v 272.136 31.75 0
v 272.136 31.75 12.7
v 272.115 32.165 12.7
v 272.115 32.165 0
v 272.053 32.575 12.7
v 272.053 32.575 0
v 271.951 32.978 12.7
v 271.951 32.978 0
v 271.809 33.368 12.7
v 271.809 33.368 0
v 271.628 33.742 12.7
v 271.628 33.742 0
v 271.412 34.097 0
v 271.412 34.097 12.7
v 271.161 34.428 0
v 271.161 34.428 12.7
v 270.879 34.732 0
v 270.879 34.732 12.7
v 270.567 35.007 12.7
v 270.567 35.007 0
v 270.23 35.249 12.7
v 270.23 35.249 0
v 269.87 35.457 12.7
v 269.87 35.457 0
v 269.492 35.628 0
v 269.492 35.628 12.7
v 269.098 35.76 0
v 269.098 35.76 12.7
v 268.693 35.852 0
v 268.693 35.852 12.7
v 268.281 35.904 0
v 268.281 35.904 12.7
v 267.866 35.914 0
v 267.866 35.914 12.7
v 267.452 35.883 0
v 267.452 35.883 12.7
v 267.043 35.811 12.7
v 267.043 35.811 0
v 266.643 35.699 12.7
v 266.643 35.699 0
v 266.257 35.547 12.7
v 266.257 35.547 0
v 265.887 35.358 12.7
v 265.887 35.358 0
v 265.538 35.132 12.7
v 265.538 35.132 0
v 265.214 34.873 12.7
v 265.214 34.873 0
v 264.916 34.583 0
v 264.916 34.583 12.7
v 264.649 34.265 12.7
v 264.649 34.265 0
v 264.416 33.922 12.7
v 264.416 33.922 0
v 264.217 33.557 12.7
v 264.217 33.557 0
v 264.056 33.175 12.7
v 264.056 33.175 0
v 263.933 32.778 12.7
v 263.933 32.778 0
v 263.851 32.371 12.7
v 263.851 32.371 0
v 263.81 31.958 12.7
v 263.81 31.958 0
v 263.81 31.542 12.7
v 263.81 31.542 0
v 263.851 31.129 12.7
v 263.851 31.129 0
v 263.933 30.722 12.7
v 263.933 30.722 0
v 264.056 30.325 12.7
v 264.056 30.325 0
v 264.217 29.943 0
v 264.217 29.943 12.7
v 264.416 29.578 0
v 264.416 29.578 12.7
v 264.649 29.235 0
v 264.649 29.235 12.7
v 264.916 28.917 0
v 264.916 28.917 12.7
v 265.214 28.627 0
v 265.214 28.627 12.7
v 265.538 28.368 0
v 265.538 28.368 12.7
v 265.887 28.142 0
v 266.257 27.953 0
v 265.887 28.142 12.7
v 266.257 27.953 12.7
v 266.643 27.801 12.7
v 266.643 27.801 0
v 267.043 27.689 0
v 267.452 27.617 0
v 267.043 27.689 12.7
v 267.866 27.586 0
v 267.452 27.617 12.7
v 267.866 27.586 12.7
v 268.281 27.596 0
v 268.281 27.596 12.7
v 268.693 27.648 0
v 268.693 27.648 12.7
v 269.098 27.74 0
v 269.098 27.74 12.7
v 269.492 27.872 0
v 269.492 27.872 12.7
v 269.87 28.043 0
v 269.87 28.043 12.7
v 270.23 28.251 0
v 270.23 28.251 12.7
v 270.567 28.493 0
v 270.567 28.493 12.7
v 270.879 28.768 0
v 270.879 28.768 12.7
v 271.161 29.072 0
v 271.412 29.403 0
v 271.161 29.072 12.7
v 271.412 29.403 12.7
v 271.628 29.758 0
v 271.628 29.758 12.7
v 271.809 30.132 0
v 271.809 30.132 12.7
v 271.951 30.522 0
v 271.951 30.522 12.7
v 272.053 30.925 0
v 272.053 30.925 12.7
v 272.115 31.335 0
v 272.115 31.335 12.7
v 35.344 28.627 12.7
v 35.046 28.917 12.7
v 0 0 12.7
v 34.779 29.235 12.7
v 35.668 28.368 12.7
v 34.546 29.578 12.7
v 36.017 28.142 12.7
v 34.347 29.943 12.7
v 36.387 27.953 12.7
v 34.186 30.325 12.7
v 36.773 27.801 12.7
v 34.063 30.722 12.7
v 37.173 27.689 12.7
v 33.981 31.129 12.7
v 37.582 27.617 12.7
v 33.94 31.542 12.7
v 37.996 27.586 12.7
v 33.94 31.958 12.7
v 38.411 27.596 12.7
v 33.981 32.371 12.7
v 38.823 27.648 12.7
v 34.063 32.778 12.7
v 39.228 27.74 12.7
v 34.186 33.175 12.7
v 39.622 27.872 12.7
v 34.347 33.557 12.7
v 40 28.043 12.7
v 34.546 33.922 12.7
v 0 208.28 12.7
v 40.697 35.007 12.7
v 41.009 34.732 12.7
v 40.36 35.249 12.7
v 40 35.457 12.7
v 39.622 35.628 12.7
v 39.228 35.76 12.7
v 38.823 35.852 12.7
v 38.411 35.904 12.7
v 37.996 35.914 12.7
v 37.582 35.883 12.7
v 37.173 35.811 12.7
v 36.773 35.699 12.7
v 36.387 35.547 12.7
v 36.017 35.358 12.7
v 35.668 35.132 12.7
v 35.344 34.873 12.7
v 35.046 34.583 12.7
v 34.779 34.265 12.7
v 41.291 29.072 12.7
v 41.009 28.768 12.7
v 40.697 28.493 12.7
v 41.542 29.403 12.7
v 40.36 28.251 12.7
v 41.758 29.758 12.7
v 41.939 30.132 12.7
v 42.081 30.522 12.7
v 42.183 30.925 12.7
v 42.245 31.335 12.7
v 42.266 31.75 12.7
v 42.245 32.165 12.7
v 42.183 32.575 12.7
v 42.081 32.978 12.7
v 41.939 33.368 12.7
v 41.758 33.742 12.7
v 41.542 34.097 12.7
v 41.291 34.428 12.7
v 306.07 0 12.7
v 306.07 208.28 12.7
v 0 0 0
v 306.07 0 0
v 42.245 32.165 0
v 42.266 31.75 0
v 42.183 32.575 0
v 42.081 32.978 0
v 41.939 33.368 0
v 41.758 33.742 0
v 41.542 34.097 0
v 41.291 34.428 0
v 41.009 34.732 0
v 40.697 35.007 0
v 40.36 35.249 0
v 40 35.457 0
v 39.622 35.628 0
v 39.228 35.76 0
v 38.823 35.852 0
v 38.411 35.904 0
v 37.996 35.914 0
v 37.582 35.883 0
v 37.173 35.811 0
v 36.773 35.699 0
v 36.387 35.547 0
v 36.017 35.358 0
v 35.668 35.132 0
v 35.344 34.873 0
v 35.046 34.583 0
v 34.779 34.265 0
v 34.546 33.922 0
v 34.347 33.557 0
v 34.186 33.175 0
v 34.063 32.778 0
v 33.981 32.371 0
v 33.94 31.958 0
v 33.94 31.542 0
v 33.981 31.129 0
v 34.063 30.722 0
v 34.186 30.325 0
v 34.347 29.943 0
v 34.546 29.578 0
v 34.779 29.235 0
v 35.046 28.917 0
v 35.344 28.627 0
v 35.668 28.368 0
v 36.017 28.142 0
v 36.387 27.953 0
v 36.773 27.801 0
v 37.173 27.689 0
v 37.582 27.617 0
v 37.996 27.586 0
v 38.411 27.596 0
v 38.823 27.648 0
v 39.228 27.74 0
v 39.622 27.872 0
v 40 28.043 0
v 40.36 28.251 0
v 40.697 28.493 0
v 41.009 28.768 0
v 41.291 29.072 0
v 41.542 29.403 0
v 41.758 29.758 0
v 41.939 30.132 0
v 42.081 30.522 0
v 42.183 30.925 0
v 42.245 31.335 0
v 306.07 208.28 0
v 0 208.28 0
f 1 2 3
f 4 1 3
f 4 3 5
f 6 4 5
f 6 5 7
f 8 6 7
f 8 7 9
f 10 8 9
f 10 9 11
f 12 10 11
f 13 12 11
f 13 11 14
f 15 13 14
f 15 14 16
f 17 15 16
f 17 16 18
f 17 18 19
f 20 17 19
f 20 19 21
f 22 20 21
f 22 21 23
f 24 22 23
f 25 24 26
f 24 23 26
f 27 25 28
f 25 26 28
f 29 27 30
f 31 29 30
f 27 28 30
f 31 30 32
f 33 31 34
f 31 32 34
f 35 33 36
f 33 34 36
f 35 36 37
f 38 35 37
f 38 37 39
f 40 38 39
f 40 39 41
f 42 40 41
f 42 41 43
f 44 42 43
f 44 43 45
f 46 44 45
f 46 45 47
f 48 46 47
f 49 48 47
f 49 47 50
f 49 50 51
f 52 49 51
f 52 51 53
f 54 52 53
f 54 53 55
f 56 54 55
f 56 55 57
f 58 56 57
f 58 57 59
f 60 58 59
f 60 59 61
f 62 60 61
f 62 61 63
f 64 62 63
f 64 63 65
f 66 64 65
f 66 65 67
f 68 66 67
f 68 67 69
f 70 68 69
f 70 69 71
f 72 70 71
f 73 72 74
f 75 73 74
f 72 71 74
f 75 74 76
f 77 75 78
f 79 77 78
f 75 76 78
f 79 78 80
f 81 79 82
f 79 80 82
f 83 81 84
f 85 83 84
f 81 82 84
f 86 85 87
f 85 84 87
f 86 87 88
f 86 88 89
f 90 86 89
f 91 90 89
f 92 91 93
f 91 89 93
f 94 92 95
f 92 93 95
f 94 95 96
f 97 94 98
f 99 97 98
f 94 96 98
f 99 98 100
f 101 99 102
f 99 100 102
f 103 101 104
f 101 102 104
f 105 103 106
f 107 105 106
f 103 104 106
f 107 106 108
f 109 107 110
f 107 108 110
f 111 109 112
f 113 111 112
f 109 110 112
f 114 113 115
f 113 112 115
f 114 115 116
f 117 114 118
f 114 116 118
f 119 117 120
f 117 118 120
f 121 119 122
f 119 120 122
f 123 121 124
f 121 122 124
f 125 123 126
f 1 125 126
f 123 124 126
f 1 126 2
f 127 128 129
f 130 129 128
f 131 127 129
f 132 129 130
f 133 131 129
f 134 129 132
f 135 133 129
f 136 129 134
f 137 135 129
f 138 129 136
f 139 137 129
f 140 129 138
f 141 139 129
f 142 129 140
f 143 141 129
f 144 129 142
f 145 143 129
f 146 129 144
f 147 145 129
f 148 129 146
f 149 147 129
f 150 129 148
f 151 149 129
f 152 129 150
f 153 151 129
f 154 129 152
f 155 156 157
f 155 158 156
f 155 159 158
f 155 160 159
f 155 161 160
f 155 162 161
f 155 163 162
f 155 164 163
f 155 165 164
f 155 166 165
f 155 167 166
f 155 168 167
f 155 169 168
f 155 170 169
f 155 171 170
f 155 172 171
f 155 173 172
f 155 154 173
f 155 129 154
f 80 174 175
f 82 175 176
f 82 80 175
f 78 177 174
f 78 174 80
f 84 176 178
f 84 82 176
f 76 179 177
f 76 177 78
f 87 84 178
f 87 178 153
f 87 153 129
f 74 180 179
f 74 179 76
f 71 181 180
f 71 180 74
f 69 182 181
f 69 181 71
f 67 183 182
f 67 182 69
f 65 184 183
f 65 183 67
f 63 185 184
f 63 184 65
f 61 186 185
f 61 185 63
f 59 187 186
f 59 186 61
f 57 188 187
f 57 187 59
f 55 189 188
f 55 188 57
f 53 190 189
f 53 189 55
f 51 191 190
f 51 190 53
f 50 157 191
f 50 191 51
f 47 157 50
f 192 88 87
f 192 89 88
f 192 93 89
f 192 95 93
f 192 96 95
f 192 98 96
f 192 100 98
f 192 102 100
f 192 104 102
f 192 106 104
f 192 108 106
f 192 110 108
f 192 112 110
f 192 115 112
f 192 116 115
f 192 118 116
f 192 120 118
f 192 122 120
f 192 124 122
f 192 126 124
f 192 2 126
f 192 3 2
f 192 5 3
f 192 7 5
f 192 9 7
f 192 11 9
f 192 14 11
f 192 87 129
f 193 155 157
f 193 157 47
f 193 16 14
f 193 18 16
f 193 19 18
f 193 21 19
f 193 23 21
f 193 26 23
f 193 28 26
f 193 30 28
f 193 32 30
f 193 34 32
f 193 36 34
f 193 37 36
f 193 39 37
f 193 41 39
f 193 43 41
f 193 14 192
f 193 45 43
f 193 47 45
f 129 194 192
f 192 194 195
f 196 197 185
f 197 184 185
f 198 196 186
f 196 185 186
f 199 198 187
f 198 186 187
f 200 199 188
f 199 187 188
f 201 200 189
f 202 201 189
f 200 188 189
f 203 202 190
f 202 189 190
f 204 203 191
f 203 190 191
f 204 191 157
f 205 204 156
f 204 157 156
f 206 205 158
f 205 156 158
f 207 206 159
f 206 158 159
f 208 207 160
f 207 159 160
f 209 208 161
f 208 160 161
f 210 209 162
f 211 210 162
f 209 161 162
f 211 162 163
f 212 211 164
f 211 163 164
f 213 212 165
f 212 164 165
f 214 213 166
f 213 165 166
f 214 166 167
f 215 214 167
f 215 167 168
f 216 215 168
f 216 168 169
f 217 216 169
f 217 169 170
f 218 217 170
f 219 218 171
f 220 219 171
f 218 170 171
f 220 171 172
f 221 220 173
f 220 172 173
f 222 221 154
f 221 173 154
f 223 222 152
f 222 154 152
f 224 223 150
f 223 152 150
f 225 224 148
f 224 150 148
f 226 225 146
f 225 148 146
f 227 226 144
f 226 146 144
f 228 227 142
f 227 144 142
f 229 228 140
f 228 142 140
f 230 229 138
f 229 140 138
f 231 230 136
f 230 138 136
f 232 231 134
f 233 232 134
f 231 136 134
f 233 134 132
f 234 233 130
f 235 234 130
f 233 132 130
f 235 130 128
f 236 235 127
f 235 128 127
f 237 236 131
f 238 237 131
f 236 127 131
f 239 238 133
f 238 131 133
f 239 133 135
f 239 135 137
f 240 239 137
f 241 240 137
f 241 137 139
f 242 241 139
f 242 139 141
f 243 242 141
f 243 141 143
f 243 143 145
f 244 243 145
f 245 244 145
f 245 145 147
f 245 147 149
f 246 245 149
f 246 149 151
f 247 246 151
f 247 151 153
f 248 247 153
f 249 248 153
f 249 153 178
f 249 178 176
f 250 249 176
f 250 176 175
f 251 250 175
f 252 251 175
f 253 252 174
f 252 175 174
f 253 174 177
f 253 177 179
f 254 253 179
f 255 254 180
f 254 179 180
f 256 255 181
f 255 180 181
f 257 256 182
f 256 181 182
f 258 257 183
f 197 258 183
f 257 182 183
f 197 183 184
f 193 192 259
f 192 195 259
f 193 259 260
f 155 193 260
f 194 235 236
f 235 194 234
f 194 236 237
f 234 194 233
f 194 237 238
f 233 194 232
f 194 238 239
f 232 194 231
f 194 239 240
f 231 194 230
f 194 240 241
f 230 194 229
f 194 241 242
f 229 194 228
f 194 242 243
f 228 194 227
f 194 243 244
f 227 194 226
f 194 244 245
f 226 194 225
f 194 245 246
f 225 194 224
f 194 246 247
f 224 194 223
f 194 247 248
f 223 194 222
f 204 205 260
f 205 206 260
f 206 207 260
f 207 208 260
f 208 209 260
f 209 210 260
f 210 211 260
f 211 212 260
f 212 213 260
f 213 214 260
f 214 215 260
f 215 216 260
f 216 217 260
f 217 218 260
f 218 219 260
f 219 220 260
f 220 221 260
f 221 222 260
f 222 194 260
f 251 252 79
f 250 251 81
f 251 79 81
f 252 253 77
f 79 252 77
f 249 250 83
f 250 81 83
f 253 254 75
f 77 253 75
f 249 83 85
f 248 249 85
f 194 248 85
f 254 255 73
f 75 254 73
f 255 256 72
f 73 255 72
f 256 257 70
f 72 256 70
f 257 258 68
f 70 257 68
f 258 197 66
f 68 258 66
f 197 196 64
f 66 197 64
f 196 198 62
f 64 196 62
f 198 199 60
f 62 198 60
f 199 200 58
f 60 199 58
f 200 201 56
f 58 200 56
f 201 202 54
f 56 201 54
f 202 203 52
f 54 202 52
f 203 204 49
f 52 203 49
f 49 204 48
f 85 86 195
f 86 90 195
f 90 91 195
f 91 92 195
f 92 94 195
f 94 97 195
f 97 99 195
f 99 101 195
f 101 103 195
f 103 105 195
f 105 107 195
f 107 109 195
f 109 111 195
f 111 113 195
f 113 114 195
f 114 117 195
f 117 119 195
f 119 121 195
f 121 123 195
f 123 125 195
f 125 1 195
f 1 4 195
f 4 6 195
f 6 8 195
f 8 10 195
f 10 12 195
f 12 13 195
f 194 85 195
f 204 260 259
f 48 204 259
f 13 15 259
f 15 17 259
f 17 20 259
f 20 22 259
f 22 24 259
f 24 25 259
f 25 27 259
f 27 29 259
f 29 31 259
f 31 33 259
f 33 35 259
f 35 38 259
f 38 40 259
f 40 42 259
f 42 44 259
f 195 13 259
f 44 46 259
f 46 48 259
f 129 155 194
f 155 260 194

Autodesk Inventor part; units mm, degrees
ref_plane "YZ Plane" through (0, 0, 0) normal (1, 0, 0) x (0, 1, 0)
ref_plane "XZ Plane" through (0, 0, 0) normal (0, 1, 0) x (-1, 0, 0)
ref_plane "XY Plane" through (0, 0, 0) normal (0, 0, 1) x (1, 0, 0)
sketch "Sketch1" plane through (0, 0, 0) normal (0, 0, 1) x (1, 0, 0)
  line L0 (0, 0) -> (306.07, 0)
  line L1 (306.07, 0) -> (306.07, 208.28)
  line L2 (306.07, 208.28) -> (0, 208.28)
  line L3 (0, 208.28) -> (0, 0)
  dimension "d0" = 306.07
  dimension "d1" = 208.28
extrude "Extrusion1" add sketch "Sketch1" along normal blind 12.7
sketch "Sketch2" plane through (0, 0, 12.7) normal (0, 0, 1) x (1, 0, 0)
  circle A0 centre (38.1, 31.75) radius 4.1656
  circle A1 centre (267.97, 31.75) radius 4.1656
  line L0 (306.07, 0) -> (306.07, 208.28) projected
  line L1 (0, 208.28) -> (0, 0) projected
  line L2 (0, 0) -> (306.07, 0) projected
  dimension "d4" = 8.3312
  dimension "d5" = 8.3312
  dimension "d6" = 38.1
  dimension "d7" = 38.1
  dimension "d8" = 31.75
  dimension "d9" = 31.75
extrude "Extrusion2" cut sketch "Sketch2" against normal blind 25.4
properties part number "rear angled wall"
